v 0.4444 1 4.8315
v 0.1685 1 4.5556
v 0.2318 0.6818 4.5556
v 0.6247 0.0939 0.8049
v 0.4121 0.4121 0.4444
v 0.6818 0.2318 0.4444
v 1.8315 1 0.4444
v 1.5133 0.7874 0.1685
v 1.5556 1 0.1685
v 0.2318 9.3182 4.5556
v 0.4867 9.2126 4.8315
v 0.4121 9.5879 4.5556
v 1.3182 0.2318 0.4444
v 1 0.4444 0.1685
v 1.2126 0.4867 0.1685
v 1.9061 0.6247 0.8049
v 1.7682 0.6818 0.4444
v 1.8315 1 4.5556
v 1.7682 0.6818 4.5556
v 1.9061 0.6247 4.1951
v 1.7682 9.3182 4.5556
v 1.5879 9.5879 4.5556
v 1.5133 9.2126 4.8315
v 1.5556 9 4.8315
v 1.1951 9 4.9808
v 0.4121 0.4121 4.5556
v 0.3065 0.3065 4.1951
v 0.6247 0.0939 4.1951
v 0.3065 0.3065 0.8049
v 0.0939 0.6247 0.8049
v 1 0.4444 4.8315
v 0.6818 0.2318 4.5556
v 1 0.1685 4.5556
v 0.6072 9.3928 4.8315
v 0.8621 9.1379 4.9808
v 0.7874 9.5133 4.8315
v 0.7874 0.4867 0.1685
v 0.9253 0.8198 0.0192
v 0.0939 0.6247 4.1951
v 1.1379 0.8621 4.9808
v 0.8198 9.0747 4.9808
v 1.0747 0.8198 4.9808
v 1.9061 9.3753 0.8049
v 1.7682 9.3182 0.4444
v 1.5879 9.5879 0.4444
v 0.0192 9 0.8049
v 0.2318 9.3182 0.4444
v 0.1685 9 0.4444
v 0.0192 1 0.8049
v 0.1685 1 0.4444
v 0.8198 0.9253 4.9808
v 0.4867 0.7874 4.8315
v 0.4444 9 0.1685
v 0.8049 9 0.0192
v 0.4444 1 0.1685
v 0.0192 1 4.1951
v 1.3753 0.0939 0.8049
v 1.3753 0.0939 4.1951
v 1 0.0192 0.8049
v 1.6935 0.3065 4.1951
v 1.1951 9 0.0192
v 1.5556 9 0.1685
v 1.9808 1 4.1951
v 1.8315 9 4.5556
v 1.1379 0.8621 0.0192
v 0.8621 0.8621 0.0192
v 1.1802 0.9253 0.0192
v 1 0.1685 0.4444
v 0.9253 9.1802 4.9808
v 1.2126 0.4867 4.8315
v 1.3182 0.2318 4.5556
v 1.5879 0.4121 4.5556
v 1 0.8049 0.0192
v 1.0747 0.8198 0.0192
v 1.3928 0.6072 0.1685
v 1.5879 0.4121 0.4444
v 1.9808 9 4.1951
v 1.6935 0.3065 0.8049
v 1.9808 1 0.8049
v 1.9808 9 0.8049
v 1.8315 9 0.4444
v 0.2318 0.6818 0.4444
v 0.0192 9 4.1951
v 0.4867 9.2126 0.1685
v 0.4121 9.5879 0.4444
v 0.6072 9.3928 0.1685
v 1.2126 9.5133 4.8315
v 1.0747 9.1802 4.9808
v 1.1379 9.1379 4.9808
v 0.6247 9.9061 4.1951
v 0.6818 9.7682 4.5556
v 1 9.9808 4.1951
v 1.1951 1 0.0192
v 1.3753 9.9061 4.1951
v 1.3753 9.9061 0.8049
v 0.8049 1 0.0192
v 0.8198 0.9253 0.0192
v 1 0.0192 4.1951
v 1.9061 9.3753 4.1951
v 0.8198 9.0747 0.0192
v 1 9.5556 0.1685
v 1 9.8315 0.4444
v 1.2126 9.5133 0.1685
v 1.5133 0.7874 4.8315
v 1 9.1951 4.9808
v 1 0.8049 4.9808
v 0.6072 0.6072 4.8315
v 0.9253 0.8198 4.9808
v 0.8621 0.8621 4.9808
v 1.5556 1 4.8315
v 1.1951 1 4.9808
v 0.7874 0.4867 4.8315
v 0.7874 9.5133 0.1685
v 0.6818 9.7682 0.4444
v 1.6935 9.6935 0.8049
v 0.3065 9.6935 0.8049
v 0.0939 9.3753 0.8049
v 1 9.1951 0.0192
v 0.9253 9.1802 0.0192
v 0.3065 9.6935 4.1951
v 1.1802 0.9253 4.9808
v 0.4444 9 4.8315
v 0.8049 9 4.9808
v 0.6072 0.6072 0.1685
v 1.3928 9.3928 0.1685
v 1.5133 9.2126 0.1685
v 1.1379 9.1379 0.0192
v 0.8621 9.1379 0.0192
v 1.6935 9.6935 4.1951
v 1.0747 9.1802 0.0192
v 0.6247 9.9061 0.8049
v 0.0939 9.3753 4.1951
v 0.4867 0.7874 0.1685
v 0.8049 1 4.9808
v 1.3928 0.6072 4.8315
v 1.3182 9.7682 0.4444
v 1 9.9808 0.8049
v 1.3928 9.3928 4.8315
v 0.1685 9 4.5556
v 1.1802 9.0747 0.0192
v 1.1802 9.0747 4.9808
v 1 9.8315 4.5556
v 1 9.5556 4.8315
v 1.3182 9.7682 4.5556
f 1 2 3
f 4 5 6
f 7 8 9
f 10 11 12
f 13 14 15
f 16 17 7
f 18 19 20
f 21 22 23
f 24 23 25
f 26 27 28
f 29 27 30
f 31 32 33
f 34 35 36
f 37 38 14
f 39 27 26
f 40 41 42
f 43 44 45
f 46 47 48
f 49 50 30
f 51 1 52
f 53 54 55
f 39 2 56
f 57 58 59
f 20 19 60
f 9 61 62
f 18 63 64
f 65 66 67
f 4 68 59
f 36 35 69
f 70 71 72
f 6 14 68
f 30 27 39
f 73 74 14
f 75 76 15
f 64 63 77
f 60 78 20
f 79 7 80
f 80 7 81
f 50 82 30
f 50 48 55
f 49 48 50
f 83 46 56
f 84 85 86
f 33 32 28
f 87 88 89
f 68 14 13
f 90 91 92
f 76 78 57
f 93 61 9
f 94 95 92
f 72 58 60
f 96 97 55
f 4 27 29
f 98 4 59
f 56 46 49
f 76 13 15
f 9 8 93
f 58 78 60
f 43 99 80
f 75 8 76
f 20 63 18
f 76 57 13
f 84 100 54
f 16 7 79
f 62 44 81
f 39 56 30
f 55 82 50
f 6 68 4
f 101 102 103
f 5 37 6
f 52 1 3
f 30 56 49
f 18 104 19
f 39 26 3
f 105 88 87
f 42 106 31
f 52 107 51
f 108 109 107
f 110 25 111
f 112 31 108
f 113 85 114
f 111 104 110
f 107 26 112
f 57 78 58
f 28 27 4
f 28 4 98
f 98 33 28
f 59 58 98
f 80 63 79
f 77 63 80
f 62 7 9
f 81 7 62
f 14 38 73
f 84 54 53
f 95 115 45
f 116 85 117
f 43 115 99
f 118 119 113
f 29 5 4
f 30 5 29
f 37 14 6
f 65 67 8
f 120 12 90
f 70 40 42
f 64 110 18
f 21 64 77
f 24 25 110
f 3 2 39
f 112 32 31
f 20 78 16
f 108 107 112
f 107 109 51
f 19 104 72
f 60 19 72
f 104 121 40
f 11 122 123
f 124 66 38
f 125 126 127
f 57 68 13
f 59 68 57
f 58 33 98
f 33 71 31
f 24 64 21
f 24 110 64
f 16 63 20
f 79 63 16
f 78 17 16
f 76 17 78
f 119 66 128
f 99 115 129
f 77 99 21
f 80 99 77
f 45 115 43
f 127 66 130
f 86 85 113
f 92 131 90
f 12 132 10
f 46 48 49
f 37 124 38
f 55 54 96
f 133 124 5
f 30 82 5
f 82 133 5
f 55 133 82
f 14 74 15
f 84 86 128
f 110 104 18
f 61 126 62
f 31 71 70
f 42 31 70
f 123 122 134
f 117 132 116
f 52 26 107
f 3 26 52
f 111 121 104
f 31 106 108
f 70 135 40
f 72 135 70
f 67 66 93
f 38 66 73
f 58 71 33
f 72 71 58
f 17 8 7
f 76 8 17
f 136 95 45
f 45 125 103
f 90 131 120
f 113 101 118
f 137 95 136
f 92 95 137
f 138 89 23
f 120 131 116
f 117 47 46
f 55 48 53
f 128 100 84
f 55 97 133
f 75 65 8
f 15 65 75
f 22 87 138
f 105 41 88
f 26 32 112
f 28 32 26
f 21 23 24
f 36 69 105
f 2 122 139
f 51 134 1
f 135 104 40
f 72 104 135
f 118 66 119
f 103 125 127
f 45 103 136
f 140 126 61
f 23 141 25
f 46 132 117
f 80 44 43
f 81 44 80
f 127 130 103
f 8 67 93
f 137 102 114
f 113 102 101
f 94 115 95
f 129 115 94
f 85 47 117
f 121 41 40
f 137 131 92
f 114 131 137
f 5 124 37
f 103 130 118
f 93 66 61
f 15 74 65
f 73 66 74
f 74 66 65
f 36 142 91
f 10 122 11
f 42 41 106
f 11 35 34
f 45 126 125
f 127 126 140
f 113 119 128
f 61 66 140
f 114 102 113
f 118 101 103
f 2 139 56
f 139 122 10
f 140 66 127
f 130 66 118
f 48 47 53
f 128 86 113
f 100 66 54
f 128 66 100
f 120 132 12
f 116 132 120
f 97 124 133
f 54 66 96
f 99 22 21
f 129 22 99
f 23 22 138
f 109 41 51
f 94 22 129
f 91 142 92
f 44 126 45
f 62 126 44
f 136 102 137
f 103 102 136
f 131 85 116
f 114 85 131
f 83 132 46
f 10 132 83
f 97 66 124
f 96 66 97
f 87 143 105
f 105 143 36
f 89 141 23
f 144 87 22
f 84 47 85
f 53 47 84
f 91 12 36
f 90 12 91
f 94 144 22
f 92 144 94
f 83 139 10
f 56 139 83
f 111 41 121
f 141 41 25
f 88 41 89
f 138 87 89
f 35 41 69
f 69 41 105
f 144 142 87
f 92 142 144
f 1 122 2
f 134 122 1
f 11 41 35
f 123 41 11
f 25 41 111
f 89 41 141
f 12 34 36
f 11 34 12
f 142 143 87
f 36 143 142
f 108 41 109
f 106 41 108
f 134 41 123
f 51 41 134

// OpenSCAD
// Rounded Rectangular Parallelepiped module - faster than minkowski!
// variables with "customizer" in them are only for the Thingiverse customizer and are not essential.


customizer_x=2;
customizer_y=10;
customizer_z=5;

customizer_facets=16;
customizer_rounding_radius=1;

module rounded_cube(size_x,size_y,size_z,facets,rounding_radius)
{
	hull()
	{
		translate([rounding_radius,        rounding_radius,        rounding_radius]) sphere (r=rounding_radius, $fn=facets);
		translate([size_x-rounding_radius, rounding_radius,        rounding_radius]) sphere (r=rounding_radius, $fn=facets);
		translate([rounding_radius,        size_y-rounding_radius, rounding_radius]) sphere (r=rounding_radius, $fn=facets);
		translate([size_x-rounding_radius, size_y-rounding_radius, rounding_radius]) sphere (r=rounding_radius, $fn=facets);

		translate([rounding_radius,        rounding_radius,        size_z-rounding_radius]) sphere (r=rounding_radius, $fn=facets);
		translate([size_x-rounding_radius, rounding_radius,        size_z-rounding_radius]) sphere (r=rounding_radius, $fn=facets);
		translate([rounding_radius,        size_y-rounding_radius, size_z-rounding_radius]) sphere (r=rounding_radius, $fn=facets);
		translate([size_x-rounding_radius, size_y-rounding_radius, size_z-rounding_radius]) sphere (r=rounding_radius, $fn=facets);
	}
}

rounded_cube(customizer_x, customizer_y, customizer_z, customizer_facets, customizer_rounding_radius);
